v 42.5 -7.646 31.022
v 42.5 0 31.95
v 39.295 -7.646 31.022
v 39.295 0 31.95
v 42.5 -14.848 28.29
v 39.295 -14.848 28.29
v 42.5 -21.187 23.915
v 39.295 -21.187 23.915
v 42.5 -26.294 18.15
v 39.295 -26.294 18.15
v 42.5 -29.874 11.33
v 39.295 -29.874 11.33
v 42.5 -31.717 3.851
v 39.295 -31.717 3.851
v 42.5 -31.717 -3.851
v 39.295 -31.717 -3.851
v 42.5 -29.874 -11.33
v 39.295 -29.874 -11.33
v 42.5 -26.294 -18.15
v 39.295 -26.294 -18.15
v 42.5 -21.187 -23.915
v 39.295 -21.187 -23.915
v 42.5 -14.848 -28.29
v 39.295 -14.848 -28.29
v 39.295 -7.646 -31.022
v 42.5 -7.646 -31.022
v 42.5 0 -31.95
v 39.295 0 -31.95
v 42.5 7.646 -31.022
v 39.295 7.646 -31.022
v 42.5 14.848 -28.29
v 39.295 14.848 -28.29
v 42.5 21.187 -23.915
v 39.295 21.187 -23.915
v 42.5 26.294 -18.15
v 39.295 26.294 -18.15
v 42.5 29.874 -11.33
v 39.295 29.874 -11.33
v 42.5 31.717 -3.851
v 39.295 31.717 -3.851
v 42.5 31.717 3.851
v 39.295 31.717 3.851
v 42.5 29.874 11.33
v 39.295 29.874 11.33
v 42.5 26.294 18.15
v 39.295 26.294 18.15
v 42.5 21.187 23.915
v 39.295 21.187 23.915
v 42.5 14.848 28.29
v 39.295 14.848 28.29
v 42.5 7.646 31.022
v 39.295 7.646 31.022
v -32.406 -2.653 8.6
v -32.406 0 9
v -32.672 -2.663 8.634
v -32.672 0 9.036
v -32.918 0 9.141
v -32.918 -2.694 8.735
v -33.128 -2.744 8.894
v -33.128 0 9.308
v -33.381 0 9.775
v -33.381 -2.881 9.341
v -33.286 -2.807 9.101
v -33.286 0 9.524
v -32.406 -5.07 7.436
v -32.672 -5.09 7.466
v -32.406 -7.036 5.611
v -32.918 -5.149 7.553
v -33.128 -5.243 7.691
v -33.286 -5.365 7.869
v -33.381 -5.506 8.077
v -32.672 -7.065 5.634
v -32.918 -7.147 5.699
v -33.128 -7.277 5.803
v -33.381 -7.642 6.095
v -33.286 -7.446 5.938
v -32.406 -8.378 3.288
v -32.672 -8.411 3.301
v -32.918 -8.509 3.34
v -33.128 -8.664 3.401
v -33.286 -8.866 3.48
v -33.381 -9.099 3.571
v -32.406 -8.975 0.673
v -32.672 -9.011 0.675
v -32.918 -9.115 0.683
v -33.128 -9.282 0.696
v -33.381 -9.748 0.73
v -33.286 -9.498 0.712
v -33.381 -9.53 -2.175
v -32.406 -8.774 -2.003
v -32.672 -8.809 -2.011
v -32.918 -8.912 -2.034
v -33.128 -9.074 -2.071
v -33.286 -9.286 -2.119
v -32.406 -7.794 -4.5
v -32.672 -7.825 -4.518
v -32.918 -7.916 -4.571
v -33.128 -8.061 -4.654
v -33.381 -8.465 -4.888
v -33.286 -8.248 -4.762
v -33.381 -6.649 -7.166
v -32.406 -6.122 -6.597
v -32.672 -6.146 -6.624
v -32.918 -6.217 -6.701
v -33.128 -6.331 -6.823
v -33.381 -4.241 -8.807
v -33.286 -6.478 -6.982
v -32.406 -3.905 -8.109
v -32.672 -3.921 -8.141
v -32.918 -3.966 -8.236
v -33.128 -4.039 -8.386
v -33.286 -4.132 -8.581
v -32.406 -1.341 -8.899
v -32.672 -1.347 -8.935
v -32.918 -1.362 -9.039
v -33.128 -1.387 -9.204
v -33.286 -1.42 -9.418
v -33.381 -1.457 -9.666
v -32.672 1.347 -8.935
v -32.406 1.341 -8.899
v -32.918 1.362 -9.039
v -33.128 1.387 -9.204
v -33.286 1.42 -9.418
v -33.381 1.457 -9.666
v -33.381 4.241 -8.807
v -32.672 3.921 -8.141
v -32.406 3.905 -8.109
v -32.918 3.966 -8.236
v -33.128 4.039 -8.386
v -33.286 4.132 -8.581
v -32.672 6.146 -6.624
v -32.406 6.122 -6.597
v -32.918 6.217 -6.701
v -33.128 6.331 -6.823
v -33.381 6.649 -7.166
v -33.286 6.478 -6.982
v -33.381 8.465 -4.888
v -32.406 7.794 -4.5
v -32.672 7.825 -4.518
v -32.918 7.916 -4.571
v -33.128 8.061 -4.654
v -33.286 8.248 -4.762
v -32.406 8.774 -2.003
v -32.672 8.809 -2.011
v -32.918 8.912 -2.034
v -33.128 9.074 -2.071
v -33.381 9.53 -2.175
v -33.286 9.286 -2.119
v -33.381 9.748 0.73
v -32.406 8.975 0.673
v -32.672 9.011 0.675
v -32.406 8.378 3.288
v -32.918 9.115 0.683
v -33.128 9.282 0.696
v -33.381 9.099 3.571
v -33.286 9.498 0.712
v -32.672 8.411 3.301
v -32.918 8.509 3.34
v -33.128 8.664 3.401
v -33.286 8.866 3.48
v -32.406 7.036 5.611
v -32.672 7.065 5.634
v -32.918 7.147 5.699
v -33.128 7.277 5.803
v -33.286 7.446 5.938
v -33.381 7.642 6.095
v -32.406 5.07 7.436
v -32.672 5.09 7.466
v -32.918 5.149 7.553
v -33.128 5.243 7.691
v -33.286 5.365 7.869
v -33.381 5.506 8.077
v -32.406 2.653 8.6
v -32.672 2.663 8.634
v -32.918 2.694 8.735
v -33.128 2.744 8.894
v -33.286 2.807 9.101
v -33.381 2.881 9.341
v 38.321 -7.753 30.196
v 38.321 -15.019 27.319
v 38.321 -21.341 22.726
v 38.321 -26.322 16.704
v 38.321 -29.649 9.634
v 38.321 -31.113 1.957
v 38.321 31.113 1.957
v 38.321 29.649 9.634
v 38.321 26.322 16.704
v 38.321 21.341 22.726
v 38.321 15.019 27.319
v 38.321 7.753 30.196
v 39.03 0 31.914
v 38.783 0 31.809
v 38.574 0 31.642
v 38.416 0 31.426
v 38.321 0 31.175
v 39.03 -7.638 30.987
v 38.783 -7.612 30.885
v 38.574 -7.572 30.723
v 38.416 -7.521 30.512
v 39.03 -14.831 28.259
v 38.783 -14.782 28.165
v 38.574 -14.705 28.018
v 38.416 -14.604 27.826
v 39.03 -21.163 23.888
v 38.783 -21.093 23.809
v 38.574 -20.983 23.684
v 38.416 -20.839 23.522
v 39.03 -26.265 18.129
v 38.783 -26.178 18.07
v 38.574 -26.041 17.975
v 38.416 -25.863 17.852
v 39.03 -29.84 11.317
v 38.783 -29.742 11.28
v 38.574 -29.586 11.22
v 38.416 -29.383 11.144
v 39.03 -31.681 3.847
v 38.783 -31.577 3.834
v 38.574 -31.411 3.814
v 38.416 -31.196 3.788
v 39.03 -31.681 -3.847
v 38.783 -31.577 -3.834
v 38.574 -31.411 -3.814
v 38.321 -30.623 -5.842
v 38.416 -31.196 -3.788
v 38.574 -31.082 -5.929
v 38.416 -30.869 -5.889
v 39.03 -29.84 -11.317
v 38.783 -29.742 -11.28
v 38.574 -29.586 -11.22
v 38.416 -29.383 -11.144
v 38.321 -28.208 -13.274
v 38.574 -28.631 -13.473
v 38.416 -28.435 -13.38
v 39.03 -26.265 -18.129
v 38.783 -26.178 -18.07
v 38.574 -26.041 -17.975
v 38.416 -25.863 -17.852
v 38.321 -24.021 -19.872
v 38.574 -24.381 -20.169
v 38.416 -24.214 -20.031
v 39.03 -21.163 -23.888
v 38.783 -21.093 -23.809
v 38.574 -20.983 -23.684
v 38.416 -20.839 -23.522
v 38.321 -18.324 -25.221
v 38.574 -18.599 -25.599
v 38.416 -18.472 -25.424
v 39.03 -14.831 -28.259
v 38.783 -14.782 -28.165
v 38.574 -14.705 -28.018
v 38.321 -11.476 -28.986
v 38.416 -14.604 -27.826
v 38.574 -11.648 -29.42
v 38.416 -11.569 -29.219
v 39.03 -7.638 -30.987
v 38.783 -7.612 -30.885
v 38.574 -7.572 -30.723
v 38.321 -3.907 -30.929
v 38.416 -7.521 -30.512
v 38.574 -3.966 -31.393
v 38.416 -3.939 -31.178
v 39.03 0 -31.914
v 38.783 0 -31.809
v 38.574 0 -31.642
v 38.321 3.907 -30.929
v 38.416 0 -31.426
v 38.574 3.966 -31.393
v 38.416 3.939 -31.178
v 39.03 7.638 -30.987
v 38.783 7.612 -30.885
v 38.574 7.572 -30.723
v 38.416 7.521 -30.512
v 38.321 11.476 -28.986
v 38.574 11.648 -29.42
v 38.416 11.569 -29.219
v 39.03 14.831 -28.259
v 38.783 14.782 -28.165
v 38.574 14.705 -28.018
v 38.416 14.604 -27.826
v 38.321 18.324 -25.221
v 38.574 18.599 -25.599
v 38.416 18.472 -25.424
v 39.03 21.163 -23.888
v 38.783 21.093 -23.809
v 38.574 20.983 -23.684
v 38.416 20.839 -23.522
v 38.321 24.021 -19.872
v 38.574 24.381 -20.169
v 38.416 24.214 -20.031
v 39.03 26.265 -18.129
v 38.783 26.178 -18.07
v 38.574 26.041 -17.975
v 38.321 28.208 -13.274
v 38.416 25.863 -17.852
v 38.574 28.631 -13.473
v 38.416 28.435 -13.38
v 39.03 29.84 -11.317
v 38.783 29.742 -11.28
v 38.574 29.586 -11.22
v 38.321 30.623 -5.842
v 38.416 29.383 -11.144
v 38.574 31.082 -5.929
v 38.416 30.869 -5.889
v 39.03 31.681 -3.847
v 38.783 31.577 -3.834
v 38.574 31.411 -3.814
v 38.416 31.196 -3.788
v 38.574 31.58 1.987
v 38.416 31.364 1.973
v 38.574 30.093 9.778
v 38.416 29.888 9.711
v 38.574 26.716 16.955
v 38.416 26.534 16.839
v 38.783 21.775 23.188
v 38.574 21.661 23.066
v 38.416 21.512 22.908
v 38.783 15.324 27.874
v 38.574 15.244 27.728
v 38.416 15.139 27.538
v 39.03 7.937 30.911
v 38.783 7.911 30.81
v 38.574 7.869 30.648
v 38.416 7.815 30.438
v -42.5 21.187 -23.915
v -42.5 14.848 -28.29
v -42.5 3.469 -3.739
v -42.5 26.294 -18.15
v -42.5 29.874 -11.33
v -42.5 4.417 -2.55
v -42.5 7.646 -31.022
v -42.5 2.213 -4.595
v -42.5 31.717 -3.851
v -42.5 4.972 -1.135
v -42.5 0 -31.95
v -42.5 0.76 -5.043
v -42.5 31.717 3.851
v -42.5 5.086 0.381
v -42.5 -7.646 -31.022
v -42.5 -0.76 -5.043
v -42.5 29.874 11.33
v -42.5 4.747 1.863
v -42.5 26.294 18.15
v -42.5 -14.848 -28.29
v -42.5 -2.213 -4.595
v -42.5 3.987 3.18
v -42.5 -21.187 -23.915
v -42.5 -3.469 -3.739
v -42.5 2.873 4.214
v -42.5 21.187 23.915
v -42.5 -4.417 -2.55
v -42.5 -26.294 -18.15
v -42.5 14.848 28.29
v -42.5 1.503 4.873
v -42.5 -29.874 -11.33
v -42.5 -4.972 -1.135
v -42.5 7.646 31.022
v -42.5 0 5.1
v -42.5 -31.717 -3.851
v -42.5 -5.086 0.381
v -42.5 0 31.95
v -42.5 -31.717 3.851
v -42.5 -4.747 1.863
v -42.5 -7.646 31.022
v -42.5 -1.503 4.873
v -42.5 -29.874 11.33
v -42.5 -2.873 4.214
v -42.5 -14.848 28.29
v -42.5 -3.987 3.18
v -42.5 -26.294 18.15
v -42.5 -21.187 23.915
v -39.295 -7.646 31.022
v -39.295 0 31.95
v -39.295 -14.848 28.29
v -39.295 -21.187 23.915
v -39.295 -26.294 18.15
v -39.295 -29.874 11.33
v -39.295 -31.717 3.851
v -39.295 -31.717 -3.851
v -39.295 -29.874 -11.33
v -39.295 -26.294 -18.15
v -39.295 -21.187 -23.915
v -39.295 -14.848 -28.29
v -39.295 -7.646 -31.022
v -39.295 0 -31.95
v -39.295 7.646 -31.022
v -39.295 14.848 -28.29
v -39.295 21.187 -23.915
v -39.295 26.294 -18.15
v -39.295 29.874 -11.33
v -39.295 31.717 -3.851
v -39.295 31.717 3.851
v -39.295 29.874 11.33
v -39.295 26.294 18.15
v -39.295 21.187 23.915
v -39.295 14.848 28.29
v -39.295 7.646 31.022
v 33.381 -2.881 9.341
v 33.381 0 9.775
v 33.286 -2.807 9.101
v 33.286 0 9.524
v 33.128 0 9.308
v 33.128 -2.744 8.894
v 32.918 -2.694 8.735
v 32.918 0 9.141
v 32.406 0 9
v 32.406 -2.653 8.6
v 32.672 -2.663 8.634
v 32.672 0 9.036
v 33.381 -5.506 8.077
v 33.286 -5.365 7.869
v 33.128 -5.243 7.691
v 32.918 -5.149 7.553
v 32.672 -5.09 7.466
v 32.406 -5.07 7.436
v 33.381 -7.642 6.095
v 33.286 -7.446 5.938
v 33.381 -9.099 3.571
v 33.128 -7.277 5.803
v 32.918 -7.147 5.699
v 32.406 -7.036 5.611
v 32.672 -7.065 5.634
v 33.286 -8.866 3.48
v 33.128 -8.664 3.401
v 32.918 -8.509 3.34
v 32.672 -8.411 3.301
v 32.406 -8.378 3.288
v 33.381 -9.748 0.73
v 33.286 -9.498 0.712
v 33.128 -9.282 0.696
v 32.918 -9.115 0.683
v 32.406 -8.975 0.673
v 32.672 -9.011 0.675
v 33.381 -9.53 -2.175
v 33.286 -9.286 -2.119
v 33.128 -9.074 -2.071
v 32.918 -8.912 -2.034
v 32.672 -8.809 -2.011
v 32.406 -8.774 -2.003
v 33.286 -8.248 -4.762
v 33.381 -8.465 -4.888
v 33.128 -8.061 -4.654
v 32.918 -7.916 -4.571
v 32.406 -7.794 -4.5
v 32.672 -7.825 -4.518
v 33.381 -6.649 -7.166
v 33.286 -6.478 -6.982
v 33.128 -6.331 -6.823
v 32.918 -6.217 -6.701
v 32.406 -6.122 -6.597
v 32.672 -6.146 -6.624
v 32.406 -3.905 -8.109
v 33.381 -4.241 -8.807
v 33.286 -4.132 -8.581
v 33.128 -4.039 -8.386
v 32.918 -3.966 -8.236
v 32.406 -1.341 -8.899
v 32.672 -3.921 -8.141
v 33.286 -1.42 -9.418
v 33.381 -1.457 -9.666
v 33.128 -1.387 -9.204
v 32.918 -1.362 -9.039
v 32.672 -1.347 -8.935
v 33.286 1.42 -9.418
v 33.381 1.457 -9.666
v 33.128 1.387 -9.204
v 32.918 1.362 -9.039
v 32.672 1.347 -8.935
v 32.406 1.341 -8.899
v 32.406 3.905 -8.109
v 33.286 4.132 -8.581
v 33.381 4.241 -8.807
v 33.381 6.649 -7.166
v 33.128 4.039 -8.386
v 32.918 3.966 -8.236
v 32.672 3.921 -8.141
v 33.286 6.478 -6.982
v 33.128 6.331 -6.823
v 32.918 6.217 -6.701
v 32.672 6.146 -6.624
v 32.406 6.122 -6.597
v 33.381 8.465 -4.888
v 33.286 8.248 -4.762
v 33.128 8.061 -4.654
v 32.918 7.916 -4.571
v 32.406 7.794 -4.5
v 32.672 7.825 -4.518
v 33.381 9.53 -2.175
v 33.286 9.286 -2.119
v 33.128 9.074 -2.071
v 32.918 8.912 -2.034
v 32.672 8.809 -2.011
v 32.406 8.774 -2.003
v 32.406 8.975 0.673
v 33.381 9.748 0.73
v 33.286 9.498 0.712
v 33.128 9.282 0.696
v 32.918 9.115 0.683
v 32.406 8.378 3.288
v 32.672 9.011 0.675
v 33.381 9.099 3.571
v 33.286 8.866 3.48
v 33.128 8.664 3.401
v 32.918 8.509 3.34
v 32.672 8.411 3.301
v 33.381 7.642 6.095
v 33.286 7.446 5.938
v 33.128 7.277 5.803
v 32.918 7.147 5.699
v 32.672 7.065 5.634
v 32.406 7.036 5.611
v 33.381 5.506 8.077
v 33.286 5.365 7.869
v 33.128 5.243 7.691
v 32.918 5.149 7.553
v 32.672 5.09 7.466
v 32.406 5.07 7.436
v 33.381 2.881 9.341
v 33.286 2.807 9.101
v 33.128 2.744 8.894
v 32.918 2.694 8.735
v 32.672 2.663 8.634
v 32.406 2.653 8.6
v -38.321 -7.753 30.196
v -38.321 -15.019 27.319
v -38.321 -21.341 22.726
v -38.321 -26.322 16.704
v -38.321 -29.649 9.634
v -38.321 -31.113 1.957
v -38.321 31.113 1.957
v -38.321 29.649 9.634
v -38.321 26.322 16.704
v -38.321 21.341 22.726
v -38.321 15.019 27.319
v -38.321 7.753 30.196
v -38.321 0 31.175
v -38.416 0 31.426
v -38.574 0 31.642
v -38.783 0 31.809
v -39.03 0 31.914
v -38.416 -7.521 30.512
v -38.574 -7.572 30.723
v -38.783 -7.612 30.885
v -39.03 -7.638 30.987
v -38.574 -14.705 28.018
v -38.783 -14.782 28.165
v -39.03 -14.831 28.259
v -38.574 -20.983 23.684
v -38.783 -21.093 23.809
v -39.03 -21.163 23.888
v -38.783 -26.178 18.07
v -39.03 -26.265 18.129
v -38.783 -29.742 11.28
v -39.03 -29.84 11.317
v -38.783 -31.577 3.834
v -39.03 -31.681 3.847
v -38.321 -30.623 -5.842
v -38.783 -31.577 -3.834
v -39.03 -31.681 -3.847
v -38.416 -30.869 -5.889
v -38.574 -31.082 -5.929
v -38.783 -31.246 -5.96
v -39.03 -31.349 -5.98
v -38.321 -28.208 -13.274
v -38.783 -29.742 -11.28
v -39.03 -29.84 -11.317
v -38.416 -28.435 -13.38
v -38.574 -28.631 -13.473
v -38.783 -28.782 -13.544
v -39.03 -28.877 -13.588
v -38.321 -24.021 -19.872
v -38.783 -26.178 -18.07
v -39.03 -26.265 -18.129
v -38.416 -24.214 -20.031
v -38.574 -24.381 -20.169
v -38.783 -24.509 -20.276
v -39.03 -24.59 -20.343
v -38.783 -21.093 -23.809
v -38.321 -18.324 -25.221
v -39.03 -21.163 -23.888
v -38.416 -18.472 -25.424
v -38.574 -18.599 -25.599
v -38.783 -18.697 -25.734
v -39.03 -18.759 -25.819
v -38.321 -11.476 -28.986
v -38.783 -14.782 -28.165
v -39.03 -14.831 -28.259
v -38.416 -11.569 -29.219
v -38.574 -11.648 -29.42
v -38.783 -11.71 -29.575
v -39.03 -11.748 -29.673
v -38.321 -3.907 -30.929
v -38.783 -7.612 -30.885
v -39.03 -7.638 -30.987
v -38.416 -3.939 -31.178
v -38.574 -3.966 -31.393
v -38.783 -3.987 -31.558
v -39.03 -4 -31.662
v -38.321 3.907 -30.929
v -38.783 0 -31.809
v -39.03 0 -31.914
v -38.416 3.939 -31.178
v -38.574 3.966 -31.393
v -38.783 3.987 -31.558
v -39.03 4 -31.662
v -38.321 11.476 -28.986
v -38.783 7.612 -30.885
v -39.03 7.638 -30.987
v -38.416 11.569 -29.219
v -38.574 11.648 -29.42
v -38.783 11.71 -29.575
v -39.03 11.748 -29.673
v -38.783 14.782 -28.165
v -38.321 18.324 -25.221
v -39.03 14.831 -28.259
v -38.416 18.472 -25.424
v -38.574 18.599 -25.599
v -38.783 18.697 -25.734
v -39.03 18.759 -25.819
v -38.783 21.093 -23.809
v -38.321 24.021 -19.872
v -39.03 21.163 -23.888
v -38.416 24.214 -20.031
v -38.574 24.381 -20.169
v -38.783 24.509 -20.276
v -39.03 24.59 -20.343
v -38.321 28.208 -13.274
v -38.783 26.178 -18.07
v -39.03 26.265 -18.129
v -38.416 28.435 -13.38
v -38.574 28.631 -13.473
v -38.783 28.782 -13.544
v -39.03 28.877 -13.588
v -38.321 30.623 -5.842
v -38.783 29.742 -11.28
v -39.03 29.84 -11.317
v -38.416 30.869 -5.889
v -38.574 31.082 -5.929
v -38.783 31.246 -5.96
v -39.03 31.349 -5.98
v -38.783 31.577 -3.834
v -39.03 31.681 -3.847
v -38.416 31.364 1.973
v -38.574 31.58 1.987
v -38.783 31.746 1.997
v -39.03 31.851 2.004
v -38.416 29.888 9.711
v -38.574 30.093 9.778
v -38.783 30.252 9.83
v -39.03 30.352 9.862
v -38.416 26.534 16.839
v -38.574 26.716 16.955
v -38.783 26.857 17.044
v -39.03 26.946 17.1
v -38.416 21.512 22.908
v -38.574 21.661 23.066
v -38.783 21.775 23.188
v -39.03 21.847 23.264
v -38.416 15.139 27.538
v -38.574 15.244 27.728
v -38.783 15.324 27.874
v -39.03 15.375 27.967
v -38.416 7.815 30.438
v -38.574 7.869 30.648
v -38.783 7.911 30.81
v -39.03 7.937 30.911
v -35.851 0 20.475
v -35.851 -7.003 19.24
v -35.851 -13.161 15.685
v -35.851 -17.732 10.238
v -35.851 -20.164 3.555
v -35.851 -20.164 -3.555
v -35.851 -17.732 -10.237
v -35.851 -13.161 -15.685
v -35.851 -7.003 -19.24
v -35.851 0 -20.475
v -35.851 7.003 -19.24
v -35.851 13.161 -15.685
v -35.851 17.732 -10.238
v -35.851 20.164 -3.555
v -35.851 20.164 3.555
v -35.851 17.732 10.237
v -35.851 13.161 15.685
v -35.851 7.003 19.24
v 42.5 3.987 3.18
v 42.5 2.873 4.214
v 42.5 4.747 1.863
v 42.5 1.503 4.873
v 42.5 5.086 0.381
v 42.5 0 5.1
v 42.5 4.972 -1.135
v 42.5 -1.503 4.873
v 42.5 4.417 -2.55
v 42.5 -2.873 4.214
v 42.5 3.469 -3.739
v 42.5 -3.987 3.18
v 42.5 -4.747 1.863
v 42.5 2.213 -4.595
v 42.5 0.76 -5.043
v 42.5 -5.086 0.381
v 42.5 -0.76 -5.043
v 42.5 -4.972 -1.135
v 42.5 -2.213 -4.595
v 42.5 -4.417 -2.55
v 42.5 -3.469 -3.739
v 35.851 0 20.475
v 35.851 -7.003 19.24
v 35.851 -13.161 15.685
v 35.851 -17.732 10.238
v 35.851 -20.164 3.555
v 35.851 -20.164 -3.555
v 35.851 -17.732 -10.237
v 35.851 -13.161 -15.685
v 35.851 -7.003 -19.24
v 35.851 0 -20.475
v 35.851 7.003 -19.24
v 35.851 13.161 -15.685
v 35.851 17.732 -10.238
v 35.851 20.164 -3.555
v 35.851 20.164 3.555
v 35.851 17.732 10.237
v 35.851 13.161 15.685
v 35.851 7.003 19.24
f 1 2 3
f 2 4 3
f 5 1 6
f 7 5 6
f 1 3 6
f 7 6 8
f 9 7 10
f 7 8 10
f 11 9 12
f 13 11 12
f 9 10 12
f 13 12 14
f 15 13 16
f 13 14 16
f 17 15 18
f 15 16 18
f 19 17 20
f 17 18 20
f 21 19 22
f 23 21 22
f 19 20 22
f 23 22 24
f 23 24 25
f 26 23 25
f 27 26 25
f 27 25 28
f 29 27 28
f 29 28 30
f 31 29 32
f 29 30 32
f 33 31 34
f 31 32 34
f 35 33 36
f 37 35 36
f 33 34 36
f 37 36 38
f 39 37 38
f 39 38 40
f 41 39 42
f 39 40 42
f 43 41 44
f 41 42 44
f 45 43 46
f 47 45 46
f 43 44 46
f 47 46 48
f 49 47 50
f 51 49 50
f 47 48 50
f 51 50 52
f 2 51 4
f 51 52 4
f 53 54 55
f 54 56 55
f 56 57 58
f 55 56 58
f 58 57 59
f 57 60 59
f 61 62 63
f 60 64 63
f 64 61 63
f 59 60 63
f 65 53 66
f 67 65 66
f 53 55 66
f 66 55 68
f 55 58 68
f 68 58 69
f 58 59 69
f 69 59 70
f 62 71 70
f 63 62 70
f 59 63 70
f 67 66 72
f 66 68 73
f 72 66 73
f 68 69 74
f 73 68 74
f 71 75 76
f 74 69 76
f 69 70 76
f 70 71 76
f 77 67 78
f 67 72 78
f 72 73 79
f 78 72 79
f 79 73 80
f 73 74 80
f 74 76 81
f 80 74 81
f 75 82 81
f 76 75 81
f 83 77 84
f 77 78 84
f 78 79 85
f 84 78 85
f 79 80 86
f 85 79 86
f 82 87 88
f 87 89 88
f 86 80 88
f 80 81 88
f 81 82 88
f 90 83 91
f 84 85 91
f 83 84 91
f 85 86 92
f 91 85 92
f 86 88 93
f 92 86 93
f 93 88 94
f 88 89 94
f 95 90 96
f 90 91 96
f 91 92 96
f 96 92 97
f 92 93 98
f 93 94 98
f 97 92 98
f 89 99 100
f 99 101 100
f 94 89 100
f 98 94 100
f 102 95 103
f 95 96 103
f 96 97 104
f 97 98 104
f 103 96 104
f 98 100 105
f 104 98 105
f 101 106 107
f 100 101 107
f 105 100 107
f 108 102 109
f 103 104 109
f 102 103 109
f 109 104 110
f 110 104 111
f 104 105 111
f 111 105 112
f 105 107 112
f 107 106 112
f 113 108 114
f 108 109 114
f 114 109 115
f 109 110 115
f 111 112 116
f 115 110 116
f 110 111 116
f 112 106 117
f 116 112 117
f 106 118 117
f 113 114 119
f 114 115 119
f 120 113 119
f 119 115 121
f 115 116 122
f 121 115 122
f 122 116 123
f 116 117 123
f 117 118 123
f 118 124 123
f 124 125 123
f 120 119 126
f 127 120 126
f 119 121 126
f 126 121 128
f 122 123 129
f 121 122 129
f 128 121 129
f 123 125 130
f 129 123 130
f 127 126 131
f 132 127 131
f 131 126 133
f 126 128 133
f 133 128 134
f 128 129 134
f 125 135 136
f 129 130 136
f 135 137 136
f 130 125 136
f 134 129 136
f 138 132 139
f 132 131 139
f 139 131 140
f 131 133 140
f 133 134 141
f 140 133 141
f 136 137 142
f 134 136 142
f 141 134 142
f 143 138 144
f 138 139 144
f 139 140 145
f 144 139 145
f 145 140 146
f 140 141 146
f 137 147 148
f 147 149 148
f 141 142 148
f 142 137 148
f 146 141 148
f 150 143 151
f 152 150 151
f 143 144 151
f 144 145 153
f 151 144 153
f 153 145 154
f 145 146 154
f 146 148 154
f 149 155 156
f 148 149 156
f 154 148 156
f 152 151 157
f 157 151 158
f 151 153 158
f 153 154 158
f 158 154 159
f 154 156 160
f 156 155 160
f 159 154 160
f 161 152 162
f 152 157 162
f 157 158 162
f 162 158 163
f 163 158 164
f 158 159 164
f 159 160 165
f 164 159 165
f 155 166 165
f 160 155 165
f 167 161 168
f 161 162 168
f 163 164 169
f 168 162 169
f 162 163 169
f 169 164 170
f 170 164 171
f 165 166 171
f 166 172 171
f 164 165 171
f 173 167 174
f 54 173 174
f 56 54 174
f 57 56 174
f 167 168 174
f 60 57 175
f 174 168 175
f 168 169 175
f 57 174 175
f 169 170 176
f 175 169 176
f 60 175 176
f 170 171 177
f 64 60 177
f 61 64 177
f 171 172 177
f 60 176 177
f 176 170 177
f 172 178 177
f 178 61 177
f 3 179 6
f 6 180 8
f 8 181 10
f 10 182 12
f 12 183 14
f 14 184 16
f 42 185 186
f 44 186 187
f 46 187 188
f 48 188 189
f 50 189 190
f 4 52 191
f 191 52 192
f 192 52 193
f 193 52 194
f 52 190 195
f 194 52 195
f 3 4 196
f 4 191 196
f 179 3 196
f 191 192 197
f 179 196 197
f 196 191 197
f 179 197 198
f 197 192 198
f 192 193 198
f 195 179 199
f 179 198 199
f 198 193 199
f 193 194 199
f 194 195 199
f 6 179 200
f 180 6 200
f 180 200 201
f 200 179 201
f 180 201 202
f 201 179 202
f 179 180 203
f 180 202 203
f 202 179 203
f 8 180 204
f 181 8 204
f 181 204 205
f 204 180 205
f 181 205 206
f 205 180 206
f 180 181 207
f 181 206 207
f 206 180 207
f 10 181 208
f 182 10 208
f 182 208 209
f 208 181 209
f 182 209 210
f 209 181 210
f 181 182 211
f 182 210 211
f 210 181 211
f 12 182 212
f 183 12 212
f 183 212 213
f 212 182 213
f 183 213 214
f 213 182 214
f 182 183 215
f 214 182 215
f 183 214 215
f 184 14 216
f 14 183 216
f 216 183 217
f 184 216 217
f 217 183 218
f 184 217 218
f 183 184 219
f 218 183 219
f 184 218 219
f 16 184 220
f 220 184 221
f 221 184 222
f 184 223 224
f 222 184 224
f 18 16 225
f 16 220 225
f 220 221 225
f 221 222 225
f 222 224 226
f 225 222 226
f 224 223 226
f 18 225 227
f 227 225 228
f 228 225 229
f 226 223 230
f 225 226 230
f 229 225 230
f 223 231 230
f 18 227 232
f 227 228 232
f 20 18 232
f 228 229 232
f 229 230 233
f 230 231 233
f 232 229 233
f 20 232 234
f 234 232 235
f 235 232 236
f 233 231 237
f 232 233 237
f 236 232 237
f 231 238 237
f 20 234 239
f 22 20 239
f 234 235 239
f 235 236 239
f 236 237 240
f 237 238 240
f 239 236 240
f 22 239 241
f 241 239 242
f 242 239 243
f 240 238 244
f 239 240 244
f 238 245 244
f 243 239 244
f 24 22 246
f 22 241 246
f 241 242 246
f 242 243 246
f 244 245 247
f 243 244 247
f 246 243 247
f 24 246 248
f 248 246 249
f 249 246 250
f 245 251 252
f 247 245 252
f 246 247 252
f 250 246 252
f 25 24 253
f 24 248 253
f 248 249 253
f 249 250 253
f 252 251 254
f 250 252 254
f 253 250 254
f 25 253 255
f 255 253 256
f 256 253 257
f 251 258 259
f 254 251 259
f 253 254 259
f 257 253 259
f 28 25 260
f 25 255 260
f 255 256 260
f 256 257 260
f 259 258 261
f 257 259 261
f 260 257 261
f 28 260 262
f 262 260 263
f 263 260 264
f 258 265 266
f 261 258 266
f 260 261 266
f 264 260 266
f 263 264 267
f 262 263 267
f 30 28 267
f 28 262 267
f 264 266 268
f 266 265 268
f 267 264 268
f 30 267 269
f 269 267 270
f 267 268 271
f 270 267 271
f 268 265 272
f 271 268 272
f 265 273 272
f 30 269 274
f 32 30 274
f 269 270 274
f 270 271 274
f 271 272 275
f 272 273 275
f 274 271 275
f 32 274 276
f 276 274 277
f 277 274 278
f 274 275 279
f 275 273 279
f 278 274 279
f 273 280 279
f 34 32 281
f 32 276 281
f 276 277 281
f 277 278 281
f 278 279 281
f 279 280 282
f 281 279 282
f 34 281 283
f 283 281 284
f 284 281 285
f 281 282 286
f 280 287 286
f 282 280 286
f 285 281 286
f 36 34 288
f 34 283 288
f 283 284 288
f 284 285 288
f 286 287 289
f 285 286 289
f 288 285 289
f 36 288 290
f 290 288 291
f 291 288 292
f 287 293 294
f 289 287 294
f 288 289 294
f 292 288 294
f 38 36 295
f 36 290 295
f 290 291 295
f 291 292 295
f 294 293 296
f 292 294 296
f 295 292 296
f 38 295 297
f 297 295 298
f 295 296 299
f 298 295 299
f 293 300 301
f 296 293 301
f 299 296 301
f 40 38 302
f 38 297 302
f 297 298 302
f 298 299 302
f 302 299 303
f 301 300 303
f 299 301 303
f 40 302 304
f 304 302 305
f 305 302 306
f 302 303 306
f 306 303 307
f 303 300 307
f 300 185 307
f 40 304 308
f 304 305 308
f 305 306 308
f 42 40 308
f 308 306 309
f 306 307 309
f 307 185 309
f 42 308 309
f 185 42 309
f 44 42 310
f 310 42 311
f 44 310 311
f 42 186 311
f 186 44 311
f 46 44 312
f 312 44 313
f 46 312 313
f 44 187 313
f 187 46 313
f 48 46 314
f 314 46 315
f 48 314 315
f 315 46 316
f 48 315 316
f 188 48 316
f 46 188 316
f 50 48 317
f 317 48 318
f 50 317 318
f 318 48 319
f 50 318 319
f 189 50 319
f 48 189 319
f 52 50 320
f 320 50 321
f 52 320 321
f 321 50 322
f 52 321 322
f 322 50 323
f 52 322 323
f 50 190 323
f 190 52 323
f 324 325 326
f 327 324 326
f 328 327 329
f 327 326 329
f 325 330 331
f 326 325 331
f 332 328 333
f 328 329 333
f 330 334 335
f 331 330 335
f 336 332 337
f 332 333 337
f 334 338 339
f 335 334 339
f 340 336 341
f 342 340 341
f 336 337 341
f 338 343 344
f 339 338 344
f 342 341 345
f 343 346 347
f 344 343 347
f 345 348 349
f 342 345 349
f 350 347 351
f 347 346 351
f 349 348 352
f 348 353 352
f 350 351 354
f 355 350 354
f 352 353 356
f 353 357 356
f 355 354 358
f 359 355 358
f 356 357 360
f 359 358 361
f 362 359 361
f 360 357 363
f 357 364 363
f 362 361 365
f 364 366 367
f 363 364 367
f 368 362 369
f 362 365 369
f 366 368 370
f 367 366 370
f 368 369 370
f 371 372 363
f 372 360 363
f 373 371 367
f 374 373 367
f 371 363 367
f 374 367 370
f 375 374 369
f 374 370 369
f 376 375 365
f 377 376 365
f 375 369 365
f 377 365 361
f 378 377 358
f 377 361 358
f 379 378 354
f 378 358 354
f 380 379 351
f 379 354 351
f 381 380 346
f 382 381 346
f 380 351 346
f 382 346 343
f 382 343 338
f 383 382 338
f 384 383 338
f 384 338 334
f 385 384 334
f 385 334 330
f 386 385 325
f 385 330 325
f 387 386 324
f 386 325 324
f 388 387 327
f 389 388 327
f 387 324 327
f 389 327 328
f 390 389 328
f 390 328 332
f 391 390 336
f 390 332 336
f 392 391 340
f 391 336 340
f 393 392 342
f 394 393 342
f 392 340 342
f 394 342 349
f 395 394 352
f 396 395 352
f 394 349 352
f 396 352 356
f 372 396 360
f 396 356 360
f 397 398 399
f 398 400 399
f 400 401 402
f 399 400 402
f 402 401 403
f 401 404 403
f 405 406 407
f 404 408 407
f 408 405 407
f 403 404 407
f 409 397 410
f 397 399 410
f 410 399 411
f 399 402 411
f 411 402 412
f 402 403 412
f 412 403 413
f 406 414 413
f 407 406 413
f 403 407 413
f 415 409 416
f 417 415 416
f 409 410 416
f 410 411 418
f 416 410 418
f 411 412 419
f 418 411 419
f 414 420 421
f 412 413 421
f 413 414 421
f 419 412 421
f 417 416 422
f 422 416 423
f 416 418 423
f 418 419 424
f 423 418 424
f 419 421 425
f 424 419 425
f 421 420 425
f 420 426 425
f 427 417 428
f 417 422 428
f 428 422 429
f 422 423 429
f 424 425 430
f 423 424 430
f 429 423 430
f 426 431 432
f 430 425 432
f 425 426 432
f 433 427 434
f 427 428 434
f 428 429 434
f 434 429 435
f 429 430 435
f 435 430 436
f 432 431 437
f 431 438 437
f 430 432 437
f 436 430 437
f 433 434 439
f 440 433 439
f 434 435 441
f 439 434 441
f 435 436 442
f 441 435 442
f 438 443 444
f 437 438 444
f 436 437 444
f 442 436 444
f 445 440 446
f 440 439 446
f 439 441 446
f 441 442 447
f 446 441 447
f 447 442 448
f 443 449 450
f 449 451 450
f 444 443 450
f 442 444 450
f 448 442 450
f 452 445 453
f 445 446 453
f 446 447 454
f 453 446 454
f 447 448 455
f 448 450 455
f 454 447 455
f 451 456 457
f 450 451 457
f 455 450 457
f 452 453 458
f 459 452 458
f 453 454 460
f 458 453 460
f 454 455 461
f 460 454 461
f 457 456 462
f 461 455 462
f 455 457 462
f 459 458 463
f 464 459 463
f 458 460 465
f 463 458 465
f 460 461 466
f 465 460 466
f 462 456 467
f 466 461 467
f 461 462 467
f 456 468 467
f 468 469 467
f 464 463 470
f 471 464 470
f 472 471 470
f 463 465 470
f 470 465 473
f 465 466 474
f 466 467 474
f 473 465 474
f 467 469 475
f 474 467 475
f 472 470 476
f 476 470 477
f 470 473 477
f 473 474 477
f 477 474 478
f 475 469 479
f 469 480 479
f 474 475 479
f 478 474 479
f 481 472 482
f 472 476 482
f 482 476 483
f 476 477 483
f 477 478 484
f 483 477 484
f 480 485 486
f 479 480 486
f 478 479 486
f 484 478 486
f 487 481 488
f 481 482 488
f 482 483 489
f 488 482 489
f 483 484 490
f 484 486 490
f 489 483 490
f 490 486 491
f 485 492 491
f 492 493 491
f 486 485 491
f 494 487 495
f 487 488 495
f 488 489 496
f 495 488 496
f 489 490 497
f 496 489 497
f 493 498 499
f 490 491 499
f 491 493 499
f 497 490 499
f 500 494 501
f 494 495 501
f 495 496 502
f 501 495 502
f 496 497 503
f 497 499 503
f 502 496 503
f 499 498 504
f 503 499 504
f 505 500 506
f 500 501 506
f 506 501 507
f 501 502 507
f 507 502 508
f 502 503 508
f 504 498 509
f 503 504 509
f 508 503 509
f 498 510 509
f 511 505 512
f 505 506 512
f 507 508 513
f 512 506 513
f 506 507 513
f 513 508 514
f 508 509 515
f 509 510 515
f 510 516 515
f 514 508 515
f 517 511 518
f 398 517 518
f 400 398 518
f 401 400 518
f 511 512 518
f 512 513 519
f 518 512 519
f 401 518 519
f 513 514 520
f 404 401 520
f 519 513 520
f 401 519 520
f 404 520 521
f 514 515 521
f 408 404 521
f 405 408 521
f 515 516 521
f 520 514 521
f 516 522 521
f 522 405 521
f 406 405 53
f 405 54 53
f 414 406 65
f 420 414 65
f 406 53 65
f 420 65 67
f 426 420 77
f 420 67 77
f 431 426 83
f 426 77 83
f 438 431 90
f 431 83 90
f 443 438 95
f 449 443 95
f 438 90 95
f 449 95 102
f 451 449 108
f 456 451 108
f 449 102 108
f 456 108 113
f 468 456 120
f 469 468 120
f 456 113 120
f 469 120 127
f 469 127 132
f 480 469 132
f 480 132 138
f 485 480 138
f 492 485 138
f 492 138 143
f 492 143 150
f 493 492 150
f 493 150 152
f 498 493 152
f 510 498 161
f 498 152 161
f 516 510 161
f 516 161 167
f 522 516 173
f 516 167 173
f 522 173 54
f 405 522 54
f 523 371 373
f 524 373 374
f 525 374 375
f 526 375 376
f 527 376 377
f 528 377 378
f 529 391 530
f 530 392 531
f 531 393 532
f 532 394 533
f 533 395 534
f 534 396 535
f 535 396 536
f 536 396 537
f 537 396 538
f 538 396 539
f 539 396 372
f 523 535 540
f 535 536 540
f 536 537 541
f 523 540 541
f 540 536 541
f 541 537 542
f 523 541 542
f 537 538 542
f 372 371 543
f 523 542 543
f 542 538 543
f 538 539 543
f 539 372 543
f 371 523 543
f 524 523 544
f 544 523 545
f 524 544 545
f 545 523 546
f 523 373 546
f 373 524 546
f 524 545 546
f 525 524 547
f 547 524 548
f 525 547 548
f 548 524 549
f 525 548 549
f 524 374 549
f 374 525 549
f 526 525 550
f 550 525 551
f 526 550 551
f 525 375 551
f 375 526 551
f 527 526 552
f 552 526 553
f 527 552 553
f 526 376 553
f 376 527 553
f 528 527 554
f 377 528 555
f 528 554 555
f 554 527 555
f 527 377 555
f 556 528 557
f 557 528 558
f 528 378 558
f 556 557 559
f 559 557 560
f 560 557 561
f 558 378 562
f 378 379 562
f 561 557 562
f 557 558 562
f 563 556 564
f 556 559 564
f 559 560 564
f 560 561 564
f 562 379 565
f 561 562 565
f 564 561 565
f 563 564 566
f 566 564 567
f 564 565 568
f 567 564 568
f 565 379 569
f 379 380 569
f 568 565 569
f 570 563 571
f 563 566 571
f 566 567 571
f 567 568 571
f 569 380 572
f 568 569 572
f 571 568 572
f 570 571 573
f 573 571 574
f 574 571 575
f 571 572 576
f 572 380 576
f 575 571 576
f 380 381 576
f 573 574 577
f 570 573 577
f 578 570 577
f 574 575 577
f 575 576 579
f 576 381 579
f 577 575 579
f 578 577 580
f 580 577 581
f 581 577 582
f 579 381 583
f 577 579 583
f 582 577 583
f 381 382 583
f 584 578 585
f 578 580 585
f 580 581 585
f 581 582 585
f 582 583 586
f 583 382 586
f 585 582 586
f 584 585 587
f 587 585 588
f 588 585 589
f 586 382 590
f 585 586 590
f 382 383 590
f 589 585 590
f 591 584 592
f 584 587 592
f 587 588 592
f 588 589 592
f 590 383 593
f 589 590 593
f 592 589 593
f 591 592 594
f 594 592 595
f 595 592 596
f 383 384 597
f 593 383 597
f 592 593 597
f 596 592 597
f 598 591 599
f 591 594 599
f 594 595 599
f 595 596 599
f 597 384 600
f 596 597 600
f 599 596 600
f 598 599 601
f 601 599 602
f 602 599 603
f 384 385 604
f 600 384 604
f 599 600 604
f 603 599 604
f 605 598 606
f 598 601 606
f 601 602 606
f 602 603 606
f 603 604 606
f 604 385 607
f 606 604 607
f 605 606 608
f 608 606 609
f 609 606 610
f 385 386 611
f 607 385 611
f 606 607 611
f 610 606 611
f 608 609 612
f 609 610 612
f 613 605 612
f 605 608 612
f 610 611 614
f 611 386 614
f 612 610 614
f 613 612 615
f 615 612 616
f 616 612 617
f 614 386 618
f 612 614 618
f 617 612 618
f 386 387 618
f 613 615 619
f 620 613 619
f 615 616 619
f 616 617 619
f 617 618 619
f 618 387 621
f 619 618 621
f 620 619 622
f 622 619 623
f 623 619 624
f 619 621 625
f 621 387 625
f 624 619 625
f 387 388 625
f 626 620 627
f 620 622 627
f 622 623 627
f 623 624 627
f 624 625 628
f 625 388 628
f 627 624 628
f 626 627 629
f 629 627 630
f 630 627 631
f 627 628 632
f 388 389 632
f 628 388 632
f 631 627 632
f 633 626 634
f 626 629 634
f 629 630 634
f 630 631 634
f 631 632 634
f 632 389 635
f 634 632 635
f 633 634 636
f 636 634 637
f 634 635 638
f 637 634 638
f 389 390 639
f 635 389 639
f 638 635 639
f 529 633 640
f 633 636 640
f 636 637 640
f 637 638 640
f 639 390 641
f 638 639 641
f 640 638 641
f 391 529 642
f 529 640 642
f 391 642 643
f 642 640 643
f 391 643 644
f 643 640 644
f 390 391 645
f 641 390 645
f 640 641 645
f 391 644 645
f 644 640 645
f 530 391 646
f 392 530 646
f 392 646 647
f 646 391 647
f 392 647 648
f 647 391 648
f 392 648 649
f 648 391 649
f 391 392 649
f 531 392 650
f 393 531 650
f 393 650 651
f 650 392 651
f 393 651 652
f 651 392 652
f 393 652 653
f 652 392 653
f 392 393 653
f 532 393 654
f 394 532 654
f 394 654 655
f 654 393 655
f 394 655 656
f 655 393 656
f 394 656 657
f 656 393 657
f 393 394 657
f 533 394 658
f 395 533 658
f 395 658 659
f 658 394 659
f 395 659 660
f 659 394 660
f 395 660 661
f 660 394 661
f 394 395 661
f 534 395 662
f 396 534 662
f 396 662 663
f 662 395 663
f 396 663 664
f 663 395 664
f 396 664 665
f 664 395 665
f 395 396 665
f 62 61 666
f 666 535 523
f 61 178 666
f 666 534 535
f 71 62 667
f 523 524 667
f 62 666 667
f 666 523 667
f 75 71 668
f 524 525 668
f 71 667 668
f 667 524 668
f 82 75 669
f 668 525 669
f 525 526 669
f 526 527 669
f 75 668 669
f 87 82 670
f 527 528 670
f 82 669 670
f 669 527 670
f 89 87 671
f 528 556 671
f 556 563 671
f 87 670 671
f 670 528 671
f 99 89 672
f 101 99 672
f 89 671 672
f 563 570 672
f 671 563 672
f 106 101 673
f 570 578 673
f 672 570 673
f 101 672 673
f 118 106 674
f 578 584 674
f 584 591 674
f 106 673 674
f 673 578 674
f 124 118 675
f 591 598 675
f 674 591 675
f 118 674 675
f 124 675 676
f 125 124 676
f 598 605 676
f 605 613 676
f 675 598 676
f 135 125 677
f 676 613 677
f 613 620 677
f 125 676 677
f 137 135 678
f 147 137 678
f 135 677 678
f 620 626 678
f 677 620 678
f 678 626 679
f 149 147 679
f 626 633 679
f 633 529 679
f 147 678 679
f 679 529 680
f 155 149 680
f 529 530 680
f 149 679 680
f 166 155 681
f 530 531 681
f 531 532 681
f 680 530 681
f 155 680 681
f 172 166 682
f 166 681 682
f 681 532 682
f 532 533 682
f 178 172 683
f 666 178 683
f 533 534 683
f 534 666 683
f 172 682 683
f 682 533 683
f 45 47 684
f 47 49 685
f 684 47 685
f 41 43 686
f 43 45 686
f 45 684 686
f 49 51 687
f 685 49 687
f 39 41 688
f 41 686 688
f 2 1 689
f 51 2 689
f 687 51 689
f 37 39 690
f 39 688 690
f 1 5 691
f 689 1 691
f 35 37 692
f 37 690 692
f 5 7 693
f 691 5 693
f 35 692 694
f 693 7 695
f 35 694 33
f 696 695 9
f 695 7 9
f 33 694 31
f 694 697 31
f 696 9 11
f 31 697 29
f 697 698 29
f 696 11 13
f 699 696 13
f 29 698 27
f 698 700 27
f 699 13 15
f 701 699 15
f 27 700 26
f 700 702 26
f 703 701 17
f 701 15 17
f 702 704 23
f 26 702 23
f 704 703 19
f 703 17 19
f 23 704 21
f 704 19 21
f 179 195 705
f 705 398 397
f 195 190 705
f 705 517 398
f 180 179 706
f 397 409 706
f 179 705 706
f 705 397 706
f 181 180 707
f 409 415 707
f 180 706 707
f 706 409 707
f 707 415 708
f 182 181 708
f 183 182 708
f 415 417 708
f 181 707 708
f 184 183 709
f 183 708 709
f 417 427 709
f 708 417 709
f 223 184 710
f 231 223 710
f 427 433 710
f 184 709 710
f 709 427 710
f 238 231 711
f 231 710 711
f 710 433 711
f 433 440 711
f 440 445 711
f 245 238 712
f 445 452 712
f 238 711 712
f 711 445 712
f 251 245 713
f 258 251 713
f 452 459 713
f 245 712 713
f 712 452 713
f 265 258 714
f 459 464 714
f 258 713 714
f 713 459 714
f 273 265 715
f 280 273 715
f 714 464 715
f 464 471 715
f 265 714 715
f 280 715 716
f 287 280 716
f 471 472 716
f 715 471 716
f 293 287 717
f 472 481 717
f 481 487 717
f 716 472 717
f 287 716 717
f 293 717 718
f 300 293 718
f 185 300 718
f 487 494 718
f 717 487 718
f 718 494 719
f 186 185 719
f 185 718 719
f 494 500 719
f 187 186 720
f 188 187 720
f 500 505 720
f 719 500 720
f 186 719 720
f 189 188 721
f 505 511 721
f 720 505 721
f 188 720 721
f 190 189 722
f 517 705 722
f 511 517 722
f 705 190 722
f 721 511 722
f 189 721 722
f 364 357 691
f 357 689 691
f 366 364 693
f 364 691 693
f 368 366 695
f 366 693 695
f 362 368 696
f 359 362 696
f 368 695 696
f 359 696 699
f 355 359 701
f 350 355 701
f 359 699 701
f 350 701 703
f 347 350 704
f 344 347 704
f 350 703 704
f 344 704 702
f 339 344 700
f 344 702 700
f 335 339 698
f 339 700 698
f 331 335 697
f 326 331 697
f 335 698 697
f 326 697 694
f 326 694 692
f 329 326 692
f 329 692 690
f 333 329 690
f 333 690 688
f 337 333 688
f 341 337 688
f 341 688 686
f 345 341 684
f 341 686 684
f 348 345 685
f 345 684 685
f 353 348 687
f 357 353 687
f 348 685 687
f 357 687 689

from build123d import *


with BuildPart() as f1:
    # F0 (on Front) → F1 (revolve)
    with BuildSketch(Plane.XZ):
        with BuildLine():
            Line((0, 5.1), (42.5, 5.1))
            Line((42.5, 5.1), (42.5, 31.95))
            Line((42.5, 31.95), (39.295436, 31.95))
            ThreePointArc((39.295436, 31.95), (38.672921, 31.732608), (38.321066, 31.174951))
            Line((38.321066, 31.174951), (33.380509, 9.775049))
            ThreePointArc((33.380509, 9.775049), (33.028654, 9.217392), (32.406139, 9))
            Line((32.406139, 9), (0, 9))
            Line((0, 9), (-32.406139, 9))
            ThreePointArc((-32.406139, 9), (-33.028654, 9.217392), (-33.380509, 9.775049))
            Line((-33.380509, 9.775049), (-38.321066, 31.174951))
            ThreePointArc((-38.321066, 31.174951), (-38.672921, 31.732608), (-39.295436, 31.95))
            Line((-39.295436, 31.95), (-42.5, 31.95))
            Line((-42.5, 31.95), (-42.5, 5.1))
            Line((-42.5, 5.1), (0, 5.1))
        make_face()
    revolve(axis=Axis((21.25, 0, 0), (1, 0, 0)))


solid = f1.part
